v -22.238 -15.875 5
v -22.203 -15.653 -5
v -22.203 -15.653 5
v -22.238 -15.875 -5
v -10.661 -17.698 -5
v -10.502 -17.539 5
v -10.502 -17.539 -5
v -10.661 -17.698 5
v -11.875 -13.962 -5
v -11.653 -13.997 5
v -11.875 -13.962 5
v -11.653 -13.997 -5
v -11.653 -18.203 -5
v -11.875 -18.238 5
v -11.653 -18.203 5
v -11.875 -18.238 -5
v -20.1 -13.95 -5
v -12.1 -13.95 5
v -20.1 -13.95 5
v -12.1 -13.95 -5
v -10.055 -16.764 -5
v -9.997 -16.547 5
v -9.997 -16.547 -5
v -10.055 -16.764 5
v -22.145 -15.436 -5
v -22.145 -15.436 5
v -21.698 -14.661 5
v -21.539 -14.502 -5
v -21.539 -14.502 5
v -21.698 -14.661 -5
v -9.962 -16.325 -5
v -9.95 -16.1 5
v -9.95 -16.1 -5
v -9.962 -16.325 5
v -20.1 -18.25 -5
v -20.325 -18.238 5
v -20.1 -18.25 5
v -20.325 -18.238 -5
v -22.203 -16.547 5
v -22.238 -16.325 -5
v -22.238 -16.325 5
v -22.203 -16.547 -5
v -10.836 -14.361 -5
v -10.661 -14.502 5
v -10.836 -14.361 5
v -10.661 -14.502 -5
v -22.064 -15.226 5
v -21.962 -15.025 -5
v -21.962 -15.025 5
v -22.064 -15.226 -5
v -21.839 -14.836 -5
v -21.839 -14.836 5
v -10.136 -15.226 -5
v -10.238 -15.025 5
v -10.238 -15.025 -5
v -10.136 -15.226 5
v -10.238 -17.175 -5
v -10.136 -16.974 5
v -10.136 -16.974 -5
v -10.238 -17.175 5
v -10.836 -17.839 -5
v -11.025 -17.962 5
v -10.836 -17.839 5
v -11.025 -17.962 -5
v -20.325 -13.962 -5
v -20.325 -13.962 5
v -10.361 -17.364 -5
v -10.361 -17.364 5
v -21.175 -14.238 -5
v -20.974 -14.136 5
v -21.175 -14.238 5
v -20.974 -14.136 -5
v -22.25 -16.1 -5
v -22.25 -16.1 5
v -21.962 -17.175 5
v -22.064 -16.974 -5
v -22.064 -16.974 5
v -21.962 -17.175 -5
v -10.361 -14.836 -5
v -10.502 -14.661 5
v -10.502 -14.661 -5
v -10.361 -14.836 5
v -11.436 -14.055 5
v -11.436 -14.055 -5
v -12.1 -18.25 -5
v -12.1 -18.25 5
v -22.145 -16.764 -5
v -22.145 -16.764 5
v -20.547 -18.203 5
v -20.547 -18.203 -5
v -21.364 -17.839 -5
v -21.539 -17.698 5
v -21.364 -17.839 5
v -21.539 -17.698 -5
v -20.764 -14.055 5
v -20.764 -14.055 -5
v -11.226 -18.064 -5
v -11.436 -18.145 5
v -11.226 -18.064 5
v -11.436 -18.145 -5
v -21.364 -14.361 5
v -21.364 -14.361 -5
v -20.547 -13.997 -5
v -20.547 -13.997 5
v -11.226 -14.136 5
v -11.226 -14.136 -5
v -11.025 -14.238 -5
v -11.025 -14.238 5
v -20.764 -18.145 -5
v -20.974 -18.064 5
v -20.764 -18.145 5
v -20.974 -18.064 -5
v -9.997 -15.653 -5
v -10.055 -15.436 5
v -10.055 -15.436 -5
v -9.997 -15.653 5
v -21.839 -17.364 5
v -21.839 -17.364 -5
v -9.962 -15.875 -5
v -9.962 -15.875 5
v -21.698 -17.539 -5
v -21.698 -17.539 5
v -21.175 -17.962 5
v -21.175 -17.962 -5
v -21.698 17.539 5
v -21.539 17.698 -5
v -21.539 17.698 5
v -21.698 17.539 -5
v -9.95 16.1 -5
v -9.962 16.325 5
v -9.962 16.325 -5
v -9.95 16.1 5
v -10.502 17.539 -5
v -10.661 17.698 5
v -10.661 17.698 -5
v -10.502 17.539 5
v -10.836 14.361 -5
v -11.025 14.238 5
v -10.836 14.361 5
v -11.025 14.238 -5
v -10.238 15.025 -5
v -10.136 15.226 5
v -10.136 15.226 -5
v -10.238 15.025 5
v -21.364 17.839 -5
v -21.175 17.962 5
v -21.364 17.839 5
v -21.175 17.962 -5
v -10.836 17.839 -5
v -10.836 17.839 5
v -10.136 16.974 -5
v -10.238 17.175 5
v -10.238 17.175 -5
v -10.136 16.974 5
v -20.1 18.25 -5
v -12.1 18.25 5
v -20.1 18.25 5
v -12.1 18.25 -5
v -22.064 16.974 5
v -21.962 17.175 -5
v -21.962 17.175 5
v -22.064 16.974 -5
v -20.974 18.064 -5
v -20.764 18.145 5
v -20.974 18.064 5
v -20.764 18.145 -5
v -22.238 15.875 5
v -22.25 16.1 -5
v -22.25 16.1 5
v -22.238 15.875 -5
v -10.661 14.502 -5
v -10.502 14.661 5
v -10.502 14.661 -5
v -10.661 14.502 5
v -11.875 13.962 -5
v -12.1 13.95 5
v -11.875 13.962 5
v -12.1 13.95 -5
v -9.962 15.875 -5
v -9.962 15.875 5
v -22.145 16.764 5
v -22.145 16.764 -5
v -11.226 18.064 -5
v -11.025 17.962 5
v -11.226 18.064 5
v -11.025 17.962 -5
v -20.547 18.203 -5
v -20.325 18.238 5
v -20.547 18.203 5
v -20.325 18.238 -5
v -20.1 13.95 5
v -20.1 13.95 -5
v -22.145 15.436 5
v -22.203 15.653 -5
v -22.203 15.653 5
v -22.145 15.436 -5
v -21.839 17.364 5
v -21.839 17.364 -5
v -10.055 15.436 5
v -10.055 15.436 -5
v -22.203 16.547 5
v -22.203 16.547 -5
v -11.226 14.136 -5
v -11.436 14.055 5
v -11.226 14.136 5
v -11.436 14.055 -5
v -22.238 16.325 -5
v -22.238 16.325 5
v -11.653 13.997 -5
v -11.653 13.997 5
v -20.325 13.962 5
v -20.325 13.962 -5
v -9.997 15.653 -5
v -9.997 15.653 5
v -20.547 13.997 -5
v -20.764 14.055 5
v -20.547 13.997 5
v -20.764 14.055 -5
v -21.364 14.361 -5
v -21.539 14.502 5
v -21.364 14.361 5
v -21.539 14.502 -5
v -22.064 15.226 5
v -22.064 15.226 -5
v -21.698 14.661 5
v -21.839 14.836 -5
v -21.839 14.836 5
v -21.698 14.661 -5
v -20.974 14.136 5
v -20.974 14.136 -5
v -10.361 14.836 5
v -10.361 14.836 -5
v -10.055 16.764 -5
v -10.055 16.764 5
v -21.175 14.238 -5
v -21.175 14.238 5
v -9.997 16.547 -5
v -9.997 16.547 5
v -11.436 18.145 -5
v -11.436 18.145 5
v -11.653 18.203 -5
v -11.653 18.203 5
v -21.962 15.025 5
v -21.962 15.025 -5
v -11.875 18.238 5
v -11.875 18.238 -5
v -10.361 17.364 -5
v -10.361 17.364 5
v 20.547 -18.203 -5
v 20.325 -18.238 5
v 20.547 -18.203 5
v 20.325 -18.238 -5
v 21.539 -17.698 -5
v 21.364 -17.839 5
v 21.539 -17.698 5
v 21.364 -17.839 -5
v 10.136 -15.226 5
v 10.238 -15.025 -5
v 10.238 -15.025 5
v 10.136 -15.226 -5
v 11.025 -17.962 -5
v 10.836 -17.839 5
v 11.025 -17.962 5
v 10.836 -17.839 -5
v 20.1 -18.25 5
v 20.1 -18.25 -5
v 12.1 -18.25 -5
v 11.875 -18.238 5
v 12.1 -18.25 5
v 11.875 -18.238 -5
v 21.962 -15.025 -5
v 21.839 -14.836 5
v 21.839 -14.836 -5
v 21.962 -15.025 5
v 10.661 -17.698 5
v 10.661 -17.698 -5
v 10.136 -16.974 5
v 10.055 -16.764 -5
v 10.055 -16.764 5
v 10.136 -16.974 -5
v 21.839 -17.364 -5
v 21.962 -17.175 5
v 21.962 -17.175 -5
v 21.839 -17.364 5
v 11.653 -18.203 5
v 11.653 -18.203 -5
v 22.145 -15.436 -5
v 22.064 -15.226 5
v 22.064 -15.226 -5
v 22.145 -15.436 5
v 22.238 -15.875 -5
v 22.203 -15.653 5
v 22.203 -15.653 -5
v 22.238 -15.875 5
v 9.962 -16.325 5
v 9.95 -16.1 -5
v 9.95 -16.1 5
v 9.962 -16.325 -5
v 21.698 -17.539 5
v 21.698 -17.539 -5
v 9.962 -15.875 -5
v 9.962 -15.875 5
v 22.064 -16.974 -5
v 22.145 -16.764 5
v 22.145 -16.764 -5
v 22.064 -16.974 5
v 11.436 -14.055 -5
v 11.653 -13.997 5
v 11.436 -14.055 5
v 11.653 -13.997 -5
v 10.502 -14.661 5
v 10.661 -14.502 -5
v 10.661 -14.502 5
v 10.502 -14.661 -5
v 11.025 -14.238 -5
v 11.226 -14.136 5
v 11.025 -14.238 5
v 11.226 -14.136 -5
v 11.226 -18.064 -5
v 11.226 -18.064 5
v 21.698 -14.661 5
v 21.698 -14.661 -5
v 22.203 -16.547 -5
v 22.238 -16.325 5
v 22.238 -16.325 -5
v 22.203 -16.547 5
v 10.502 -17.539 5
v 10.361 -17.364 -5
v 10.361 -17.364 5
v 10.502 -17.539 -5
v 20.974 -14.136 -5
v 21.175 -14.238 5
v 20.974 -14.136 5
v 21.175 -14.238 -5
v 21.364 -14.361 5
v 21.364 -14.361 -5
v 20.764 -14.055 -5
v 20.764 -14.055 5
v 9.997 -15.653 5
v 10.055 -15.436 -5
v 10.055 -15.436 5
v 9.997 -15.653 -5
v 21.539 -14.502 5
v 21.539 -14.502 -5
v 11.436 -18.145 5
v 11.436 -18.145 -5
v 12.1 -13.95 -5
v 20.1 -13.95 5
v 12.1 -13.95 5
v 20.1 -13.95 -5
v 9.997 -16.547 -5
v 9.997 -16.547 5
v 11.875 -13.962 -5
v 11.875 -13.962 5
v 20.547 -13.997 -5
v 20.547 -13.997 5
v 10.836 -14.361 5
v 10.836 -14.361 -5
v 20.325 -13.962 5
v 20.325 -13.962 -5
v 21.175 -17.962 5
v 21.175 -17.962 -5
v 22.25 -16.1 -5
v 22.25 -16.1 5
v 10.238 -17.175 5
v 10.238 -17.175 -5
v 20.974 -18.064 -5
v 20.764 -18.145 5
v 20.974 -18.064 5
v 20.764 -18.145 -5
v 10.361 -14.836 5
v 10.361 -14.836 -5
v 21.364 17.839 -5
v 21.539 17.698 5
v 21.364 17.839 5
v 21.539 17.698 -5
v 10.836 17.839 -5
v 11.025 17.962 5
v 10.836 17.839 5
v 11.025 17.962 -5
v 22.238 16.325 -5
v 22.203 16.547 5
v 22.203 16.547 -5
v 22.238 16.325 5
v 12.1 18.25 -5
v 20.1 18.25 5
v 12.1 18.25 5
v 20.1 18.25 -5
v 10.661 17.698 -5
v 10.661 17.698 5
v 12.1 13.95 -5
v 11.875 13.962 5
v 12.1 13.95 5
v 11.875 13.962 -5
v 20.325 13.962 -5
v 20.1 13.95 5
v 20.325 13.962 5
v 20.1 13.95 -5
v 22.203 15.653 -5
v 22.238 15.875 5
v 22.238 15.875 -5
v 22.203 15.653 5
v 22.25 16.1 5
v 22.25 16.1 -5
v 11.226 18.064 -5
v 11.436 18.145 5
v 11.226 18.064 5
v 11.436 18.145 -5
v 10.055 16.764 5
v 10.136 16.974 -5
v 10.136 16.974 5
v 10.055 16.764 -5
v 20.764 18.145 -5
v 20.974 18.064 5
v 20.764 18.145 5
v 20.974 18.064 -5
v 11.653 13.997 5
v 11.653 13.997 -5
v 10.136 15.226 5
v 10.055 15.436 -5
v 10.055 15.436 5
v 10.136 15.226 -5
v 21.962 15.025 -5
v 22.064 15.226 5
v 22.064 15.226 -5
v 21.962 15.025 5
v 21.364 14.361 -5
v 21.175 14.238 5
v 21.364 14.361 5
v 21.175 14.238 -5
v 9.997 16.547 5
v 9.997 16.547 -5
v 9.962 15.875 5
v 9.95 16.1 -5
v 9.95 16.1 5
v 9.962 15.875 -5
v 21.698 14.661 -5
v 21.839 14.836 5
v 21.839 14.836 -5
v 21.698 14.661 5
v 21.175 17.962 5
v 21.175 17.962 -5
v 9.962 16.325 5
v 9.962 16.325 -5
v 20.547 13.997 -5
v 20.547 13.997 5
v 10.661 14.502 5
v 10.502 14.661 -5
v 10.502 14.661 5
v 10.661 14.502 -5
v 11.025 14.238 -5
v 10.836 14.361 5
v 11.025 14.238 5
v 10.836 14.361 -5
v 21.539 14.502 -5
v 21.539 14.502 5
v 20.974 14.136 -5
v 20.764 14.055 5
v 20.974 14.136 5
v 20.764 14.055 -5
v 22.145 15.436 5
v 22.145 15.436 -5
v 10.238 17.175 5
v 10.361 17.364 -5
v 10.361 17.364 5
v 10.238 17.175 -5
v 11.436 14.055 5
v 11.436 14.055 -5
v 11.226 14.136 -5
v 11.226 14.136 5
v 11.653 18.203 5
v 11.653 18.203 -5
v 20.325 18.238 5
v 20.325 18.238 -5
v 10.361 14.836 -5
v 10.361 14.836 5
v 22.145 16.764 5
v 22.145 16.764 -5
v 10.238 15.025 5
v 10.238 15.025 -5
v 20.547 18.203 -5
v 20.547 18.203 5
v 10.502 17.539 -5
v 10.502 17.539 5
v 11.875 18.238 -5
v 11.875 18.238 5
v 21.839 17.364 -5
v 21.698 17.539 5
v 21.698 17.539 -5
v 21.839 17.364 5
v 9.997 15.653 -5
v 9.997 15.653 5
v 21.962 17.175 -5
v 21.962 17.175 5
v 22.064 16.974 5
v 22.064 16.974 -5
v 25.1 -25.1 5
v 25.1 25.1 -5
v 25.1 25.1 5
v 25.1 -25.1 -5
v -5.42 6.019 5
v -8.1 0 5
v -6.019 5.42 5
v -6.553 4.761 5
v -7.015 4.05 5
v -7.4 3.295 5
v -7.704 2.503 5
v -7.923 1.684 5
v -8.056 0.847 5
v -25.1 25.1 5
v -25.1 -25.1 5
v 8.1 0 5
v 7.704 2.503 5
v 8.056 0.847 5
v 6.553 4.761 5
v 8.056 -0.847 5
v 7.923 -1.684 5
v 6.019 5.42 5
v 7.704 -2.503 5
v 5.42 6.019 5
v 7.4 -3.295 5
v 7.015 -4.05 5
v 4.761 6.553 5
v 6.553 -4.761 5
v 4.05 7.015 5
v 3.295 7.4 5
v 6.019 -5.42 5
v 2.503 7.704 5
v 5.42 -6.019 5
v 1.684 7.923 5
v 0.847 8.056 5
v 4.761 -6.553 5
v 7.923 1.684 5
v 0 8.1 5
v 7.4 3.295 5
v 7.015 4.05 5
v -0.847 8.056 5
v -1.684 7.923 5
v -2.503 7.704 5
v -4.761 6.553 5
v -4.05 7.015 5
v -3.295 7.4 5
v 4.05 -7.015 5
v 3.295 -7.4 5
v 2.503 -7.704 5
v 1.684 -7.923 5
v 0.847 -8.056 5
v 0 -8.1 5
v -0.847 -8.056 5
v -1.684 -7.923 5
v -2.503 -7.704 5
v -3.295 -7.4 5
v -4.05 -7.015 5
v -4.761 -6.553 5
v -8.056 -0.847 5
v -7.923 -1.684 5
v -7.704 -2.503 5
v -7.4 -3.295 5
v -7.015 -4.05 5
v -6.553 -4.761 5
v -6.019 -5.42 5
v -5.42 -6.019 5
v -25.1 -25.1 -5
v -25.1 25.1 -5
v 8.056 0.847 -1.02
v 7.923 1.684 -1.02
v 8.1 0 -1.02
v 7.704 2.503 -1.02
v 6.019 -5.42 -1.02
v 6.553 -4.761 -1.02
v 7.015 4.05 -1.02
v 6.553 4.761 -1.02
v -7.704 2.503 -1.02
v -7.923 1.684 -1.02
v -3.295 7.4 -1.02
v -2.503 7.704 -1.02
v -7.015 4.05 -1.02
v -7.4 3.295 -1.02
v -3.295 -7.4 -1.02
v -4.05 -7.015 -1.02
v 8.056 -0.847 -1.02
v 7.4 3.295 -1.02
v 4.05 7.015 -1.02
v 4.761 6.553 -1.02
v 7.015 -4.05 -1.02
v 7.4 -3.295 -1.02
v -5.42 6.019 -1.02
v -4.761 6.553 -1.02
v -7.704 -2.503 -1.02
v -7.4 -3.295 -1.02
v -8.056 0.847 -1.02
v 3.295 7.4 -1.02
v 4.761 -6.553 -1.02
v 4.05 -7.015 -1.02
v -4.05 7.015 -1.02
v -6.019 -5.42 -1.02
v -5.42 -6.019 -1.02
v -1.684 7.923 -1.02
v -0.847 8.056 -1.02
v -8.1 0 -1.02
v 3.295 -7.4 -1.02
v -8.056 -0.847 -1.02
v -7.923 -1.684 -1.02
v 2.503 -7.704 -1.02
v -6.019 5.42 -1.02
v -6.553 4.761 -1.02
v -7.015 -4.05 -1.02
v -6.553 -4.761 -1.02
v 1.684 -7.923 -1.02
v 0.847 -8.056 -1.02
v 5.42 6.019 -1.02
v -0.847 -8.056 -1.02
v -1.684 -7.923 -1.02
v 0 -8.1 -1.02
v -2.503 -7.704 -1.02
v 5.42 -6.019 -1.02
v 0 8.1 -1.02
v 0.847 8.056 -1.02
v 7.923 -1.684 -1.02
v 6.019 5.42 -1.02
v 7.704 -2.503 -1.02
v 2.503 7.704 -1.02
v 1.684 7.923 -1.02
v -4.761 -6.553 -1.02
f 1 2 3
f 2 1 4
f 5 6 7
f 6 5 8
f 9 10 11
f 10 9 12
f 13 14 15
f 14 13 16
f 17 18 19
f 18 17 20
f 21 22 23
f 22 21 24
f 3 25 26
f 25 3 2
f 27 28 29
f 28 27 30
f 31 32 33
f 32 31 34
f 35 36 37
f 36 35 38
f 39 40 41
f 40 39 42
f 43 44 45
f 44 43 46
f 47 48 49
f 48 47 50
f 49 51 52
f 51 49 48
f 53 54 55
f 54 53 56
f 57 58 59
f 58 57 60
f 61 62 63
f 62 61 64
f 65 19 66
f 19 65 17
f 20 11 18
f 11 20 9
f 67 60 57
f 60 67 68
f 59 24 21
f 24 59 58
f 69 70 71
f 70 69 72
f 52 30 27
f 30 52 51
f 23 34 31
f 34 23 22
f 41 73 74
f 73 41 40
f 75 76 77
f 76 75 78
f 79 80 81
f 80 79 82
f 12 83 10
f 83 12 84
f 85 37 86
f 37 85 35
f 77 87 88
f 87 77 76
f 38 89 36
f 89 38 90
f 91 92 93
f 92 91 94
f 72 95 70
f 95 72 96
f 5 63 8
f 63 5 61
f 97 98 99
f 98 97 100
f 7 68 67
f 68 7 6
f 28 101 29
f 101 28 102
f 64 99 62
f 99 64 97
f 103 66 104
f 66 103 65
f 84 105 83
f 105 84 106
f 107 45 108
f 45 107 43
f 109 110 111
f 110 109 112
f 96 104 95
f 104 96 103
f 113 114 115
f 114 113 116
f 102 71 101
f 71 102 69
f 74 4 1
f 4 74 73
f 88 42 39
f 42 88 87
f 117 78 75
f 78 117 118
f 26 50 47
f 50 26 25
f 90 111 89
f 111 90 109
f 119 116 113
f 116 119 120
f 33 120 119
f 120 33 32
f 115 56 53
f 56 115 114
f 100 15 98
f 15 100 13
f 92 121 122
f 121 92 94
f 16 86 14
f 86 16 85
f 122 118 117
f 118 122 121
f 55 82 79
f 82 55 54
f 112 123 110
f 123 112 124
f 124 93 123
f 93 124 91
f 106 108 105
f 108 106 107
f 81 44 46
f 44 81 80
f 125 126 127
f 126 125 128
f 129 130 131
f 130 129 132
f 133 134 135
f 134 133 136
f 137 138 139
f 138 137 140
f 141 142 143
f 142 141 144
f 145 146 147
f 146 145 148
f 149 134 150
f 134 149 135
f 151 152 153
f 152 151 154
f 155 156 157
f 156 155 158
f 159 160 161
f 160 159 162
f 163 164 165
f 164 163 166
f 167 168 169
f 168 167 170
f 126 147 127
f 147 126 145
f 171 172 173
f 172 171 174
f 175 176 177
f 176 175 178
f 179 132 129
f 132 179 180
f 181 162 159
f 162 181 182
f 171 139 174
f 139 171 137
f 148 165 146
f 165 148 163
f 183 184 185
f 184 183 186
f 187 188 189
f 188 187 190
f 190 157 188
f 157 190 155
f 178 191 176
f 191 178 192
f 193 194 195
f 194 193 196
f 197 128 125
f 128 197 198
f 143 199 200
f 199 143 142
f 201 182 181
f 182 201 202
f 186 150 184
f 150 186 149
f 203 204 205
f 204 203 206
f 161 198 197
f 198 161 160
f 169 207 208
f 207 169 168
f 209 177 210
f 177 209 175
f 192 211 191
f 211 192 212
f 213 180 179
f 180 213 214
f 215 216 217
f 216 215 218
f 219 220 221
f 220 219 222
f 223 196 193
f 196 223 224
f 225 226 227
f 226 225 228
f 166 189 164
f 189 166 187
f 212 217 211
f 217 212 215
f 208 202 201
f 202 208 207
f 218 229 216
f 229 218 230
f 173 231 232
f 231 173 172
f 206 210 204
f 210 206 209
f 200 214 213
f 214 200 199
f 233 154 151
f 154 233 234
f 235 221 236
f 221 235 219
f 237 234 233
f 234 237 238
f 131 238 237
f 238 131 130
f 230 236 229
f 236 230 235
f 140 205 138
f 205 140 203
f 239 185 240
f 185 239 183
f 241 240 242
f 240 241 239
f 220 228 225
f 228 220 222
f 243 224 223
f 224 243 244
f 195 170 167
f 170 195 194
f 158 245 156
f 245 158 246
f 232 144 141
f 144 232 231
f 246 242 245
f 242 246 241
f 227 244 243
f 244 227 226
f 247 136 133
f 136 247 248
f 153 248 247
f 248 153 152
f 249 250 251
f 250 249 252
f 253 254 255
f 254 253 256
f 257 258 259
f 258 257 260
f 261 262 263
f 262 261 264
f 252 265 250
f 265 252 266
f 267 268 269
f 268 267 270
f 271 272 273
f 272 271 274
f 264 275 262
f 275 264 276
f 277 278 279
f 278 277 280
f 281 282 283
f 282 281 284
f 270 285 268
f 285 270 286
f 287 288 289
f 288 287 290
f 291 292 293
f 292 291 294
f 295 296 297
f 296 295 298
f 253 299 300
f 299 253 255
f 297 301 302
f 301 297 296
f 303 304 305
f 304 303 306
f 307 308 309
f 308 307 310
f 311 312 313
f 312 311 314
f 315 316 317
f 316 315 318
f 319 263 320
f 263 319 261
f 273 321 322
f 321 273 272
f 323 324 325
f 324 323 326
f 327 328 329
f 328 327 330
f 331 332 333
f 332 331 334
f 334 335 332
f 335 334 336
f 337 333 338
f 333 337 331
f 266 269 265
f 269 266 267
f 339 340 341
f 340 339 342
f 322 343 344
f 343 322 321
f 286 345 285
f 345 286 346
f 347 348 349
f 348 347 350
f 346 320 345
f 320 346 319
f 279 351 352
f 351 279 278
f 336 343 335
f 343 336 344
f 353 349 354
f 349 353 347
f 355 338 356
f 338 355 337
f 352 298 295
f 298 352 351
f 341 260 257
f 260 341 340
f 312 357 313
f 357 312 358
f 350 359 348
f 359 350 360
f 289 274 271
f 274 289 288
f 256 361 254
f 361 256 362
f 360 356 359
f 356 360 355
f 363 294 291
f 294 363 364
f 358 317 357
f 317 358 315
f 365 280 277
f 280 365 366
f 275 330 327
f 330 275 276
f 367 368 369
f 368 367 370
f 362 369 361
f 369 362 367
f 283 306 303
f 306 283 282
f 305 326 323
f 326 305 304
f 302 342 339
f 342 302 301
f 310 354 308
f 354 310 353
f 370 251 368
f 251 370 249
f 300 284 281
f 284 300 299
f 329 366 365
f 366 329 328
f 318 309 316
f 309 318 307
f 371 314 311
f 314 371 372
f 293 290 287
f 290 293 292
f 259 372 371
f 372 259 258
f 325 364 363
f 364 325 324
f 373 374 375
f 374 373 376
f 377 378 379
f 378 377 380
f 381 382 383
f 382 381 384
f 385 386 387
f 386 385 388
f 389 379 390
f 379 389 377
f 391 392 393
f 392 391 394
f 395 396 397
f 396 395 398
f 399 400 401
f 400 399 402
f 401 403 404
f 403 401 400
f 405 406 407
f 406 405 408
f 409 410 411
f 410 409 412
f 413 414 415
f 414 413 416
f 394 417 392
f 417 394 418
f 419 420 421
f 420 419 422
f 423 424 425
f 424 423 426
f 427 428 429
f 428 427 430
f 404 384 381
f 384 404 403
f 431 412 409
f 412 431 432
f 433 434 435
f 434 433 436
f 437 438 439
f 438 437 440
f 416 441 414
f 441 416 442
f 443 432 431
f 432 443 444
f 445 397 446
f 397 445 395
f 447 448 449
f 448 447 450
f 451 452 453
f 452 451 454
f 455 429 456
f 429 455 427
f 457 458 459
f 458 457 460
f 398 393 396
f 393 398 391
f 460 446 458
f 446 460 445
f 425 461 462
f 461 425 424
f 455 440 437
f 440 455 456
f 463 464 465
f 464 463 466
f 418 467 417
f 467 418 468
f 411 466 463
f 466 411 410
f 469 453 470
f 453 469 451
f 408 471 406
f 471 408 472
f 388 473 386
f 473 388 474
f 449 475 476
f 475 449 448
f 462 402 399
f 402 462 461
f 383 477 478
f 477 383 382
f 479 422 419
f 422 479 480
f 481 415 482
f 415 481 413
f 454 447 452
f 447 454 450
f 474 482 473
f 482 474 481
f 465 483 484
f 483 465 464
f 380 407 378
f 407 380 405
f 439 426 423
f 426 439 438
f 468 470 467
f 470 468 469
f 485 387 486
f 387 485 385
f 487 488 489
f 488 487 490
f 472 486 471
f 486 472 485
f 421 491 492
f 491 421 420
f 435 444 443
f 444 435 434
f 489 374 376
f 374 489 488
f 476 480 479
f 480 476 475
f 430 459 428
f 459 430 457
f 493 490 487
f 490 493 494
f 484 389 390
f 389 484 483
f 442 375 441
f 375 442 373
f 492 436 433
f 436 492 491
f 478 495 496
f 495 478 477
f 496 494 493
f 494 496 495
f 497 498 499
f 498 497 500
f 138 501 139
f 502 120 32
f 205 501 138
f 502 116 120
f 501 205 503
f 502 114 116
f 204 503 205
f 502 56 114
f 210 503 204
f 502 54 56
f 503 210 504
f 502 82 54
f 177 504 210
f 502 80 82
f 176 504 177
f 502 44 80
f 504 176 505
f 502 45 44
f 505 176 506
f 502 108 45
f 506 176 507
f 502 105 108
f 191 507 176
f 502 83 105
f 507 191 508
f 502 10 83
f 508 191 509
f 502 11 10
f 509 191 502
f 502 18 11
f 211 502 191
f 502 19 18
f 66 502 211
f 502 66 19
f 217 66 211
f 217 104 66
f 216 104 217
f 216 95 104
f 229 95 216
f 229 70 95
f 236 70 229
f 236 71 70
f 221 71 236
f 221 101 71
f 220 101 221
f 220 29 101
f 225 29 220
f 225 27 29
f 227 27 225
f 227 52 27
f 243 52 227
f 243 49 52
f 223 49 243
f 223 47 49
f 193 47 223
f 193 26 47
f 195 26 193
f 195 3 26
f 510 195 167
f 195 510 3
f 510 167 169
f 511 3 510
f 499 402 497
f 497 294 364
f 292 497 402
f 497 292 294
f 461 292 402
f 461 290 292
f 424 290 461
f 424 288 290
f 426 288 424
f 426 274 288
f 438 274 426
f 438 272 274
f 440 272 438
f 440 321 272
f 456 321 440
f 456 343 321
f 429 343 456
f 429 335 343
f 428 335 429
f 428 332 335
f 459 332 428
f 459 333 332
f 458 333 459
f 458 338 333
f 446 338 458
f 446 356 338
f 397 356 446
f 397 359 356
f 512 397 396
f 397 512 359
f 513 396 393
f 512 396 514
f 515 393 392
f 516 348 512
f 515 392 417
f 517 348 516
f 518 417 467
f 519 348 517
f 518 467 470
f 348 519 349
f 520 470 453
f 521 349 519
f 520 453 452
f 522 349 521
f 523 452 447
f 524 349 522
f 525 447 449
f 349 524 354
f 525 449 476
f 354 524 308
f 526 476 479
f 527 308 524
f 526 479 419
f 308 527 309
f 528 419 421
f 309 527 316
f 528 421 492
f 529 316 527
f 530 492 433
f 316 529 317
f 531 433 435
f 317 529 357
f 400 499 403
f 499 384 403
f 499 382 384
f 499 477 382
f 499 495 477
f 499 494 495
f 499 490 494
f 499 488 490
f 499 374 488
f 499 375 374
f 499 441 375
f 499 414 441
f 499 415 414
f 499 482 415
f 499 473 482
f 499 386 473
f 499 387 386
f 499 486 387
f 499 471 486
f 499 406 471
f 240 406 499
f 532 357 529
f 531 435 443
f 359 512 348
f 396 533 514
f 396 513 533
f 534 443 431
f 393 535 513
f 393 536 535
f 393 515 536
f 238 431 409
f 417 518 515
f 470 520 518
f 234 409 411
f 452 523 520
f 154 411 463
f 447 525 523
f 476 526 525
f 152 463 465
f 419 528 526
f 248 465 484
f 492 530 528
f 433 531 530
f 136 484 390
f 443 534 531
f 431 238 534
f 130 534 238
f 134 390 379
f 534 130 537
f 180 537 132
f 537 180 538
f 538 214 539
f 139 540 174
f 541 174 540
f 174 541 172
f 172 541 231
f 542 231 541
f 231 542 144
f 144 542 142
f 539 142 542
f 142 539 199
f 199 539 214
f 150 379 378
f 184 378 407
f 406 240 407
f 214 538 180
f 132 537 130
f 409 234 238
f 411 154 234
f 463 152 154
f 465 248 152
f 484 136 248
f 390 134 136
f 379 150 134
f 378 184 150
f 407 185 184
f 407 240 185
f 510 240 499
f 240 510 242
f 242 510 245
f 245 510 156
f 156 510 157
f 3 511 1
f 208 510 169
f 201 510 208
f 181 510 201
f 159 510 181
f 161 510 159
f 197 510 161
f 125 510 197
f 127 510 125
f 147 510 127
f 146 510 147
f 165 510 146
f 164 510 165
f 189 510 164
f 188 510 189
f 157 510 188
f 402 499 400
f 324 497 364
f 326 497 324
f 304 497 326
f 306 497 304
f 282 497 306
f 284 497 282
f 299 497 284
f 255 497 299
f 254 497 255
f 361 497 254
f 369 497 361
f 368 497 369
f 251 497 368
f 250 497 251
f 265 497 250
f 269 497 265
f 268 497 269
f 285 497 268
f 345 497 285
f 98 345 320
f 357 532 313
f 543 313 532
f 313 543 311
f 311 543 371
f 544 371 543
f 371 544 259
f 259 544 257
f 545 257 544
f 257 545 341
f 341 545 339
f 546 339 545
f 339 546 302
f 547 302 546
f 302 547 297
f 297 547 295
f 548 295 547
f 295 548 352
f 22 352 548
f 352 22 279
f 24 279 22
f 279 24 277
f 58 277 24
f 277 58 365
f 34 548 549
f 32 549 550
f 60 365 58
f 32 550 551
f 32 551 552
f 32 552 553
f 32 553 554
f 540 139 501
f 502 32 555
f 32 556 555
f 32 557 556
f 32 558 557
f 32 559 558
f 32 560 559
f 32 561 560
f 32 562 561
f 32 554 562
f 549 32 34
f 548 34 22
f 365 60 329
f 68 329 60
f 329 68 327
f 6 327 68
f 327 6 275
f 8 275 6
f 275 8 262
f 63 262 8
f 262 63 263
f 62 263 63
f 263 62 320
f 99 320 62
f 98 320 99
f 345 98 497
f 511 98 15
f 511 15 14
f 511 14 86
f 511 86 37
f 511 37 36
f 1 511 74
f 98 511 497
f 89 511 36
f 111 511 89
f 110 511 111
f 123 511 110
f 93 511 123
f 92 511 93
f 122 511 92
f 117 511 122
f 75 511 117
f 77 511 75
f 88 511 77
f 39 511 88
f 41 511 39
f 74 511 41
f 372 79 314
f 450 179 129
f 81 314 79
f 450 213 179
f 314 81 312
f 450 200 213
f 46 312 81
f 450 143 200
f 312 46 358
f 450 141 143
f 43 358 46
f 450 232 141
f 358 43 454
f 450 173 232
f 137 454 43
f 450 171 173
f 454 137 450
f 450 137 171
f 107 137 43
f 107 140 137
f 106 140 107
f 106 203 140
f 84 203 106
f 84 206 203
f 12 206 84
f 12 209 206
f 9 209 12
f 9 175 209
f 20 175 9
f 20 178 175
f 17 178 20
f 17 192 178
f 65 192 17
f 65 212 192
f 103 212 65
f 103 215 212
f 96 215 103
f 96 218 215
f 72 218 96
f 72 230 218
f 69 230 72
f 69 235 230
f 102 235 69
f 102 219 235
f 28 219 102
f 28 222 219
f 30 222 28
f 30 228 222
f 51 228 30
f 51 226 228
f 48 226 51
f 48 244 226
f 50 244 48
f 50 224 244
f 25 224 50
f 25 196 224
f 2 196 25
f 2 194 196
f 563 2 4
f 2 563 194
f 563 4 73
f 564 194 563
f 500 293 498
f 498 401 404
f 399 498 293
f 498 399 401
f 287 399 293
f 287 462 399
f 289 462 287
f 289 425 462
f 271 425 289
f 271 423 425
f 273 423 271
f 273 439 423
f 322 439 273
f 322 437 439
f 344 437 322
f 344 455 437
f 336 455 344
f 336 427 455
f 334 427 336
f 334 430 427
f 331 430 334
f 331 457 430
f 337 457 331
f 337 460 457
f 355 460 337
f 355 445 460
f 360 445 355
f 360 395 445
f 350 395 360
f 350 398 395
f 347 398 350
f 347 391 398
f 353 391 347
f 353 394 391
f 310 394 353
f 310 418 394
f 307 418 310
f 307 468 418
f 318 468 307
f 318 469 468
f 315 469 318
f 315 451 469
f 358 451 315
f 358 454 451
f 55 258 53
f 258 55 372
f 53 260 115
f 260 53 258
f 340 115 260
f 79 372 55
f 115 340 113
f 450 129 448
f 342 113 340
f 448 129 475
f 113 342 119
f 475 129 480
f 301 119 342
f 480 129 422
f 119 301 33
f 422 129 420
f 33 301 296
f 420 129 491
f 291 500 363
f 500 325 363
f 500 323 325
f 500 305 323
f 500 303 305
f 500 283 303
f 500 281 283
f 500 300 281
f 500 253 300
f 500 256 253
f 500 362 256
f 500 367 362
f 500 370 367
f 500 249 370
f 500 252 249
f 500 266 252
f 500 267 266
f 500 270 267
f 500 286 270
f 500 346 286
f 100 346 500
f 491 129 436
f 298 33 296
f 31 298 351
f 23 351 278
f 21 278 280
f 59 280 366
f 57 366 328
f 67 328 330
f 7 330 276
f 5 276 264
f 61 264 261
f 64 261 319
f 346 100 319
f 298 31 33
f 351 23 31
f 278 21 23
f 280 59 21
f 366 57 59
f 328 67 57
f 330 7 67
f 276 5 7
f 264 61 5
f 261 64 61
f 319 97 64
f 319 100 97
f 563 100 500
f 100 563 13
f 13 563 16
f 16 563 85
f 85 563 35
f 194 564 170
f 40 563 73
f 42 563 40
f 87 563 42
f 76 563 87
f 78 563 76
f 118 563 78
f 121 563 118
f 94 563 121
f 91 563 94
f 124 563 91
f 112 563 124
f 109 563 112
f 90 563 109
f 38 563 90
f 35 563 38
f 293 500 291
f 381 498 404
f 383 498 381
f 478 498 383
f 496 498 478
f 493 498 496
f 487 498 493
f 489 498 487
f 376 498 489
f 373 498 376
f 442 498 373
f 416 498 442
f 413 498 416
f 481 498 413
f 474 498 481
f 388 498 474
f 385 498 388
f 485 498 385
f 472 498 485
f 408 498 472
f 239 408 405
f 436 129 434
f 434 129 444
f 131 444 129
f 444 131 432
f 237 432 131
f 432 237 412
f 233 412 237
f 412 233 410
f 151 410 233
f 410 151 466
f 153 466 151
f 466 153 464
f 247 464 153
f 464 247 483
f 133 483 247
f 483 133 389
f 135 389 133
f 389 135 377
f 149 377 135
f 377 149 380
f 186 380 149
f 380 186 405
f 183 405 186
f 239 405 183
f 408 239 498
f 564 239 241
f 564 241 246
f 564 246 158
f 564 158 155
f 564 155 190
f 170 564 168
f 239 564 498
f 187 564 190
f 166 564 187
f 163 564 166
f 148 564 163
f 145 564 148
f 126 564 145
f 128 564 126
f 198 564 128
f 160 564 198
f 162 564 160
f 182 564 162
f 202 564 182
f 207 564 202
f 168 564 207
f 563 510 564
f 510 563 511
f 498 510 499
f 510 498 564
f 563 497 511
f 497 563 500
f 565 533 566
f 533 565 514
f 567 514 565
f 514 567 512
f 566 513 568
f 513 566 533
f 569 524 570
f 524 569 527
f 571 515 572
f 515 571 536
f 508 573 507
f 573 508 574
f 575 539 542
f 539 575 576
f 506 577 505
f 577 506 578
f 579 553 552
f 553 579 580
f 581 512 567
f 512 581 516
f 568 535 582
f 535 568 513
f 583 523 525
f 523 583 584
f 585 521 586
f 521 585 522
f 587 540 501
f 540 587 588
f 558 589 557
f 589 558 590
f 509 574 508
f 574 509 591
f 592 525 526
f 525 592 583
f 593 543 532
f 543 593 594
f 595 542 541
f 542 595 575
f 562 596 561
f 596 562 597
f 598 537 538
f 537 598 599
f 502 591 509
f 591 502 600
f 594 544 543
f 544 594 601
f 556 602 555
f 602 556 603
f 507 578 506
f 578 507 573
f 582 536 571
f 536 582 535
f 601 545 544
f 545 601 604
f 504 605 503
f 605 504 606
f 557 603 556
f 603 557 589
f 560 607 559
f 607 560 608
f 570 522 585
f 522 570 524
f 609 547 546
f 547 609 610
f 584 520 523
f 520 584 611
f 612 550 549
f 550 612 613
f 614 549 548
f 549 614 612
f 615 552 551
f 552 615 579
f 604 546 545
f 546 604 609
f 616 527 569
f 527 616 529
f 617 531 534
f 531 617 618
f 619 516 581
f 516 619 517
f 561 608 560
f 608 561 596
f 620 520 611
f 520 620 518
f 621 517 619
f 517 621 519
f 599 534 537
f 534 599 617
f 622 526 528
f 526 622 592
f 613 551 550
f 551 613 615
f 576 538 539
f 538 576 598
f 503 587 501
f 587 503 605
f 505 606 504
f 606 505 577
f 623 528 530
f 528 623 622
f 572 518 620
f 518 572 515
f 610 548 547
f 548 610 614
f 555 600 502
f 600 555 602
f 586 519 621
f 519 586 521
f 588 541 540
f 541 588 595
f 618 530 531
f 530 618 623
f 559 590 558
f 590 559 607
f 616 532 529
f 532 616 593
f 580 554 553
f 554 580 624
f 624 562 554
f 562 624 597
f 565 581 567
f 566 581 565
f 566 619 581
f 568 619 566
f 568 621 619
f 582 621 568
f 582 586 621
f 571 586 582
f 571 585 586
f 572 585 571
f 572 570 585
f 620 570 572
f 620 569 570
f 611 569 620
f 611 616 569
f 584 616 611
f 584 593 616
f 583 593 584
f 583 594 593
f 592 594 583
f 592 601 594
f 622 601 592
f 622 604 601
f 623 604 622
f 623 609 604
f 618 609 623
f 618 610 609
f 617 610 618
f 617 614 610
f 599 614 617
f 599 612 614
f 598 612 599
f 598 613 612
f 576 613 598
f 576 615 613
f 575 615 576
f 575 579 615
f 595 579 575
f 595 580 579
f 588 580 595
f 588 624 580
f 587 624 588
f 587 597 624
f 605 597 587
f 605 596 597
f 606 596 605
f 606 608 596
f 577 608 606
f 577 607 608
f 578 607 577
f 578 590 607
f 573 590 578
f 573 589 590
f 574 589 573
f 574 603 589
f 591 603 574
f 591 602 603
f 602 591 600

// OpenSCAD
// Bearing mounting plate with 16.2 mm pocket.
$fn = 60;
eps = 0.02;
plate_w = 50.2;
plate_t = 10;
bearing_d = 16.2;
pocket_d = 6;
mount_pitch = 32.2;
module slot(x, y) {
    hull() {
        translate([x - 4, y, -plate_t / 2 - eps]) cylinder(d = 4.3, h = plate_t + 2 * eps);
        translate([x + 4, y, -plate_t / 2 - eps]) cylinder(d = 4.3, h = plate_t + 2 * eps);
    }
}
difference() {
    cube([plate_w, plate_w, plate_t], center = true);
    translate([0, 0, plate_t / 2 - pocket_d - eps]) cylinder(d = bearing_d, h = pocket_d + 2 * eps);
    for (x = [-mount_pitch / 2, mount_pitch / 2], y = [-mount_pitch / 2, mount_pitch / 2]) slot(x, y);
}
